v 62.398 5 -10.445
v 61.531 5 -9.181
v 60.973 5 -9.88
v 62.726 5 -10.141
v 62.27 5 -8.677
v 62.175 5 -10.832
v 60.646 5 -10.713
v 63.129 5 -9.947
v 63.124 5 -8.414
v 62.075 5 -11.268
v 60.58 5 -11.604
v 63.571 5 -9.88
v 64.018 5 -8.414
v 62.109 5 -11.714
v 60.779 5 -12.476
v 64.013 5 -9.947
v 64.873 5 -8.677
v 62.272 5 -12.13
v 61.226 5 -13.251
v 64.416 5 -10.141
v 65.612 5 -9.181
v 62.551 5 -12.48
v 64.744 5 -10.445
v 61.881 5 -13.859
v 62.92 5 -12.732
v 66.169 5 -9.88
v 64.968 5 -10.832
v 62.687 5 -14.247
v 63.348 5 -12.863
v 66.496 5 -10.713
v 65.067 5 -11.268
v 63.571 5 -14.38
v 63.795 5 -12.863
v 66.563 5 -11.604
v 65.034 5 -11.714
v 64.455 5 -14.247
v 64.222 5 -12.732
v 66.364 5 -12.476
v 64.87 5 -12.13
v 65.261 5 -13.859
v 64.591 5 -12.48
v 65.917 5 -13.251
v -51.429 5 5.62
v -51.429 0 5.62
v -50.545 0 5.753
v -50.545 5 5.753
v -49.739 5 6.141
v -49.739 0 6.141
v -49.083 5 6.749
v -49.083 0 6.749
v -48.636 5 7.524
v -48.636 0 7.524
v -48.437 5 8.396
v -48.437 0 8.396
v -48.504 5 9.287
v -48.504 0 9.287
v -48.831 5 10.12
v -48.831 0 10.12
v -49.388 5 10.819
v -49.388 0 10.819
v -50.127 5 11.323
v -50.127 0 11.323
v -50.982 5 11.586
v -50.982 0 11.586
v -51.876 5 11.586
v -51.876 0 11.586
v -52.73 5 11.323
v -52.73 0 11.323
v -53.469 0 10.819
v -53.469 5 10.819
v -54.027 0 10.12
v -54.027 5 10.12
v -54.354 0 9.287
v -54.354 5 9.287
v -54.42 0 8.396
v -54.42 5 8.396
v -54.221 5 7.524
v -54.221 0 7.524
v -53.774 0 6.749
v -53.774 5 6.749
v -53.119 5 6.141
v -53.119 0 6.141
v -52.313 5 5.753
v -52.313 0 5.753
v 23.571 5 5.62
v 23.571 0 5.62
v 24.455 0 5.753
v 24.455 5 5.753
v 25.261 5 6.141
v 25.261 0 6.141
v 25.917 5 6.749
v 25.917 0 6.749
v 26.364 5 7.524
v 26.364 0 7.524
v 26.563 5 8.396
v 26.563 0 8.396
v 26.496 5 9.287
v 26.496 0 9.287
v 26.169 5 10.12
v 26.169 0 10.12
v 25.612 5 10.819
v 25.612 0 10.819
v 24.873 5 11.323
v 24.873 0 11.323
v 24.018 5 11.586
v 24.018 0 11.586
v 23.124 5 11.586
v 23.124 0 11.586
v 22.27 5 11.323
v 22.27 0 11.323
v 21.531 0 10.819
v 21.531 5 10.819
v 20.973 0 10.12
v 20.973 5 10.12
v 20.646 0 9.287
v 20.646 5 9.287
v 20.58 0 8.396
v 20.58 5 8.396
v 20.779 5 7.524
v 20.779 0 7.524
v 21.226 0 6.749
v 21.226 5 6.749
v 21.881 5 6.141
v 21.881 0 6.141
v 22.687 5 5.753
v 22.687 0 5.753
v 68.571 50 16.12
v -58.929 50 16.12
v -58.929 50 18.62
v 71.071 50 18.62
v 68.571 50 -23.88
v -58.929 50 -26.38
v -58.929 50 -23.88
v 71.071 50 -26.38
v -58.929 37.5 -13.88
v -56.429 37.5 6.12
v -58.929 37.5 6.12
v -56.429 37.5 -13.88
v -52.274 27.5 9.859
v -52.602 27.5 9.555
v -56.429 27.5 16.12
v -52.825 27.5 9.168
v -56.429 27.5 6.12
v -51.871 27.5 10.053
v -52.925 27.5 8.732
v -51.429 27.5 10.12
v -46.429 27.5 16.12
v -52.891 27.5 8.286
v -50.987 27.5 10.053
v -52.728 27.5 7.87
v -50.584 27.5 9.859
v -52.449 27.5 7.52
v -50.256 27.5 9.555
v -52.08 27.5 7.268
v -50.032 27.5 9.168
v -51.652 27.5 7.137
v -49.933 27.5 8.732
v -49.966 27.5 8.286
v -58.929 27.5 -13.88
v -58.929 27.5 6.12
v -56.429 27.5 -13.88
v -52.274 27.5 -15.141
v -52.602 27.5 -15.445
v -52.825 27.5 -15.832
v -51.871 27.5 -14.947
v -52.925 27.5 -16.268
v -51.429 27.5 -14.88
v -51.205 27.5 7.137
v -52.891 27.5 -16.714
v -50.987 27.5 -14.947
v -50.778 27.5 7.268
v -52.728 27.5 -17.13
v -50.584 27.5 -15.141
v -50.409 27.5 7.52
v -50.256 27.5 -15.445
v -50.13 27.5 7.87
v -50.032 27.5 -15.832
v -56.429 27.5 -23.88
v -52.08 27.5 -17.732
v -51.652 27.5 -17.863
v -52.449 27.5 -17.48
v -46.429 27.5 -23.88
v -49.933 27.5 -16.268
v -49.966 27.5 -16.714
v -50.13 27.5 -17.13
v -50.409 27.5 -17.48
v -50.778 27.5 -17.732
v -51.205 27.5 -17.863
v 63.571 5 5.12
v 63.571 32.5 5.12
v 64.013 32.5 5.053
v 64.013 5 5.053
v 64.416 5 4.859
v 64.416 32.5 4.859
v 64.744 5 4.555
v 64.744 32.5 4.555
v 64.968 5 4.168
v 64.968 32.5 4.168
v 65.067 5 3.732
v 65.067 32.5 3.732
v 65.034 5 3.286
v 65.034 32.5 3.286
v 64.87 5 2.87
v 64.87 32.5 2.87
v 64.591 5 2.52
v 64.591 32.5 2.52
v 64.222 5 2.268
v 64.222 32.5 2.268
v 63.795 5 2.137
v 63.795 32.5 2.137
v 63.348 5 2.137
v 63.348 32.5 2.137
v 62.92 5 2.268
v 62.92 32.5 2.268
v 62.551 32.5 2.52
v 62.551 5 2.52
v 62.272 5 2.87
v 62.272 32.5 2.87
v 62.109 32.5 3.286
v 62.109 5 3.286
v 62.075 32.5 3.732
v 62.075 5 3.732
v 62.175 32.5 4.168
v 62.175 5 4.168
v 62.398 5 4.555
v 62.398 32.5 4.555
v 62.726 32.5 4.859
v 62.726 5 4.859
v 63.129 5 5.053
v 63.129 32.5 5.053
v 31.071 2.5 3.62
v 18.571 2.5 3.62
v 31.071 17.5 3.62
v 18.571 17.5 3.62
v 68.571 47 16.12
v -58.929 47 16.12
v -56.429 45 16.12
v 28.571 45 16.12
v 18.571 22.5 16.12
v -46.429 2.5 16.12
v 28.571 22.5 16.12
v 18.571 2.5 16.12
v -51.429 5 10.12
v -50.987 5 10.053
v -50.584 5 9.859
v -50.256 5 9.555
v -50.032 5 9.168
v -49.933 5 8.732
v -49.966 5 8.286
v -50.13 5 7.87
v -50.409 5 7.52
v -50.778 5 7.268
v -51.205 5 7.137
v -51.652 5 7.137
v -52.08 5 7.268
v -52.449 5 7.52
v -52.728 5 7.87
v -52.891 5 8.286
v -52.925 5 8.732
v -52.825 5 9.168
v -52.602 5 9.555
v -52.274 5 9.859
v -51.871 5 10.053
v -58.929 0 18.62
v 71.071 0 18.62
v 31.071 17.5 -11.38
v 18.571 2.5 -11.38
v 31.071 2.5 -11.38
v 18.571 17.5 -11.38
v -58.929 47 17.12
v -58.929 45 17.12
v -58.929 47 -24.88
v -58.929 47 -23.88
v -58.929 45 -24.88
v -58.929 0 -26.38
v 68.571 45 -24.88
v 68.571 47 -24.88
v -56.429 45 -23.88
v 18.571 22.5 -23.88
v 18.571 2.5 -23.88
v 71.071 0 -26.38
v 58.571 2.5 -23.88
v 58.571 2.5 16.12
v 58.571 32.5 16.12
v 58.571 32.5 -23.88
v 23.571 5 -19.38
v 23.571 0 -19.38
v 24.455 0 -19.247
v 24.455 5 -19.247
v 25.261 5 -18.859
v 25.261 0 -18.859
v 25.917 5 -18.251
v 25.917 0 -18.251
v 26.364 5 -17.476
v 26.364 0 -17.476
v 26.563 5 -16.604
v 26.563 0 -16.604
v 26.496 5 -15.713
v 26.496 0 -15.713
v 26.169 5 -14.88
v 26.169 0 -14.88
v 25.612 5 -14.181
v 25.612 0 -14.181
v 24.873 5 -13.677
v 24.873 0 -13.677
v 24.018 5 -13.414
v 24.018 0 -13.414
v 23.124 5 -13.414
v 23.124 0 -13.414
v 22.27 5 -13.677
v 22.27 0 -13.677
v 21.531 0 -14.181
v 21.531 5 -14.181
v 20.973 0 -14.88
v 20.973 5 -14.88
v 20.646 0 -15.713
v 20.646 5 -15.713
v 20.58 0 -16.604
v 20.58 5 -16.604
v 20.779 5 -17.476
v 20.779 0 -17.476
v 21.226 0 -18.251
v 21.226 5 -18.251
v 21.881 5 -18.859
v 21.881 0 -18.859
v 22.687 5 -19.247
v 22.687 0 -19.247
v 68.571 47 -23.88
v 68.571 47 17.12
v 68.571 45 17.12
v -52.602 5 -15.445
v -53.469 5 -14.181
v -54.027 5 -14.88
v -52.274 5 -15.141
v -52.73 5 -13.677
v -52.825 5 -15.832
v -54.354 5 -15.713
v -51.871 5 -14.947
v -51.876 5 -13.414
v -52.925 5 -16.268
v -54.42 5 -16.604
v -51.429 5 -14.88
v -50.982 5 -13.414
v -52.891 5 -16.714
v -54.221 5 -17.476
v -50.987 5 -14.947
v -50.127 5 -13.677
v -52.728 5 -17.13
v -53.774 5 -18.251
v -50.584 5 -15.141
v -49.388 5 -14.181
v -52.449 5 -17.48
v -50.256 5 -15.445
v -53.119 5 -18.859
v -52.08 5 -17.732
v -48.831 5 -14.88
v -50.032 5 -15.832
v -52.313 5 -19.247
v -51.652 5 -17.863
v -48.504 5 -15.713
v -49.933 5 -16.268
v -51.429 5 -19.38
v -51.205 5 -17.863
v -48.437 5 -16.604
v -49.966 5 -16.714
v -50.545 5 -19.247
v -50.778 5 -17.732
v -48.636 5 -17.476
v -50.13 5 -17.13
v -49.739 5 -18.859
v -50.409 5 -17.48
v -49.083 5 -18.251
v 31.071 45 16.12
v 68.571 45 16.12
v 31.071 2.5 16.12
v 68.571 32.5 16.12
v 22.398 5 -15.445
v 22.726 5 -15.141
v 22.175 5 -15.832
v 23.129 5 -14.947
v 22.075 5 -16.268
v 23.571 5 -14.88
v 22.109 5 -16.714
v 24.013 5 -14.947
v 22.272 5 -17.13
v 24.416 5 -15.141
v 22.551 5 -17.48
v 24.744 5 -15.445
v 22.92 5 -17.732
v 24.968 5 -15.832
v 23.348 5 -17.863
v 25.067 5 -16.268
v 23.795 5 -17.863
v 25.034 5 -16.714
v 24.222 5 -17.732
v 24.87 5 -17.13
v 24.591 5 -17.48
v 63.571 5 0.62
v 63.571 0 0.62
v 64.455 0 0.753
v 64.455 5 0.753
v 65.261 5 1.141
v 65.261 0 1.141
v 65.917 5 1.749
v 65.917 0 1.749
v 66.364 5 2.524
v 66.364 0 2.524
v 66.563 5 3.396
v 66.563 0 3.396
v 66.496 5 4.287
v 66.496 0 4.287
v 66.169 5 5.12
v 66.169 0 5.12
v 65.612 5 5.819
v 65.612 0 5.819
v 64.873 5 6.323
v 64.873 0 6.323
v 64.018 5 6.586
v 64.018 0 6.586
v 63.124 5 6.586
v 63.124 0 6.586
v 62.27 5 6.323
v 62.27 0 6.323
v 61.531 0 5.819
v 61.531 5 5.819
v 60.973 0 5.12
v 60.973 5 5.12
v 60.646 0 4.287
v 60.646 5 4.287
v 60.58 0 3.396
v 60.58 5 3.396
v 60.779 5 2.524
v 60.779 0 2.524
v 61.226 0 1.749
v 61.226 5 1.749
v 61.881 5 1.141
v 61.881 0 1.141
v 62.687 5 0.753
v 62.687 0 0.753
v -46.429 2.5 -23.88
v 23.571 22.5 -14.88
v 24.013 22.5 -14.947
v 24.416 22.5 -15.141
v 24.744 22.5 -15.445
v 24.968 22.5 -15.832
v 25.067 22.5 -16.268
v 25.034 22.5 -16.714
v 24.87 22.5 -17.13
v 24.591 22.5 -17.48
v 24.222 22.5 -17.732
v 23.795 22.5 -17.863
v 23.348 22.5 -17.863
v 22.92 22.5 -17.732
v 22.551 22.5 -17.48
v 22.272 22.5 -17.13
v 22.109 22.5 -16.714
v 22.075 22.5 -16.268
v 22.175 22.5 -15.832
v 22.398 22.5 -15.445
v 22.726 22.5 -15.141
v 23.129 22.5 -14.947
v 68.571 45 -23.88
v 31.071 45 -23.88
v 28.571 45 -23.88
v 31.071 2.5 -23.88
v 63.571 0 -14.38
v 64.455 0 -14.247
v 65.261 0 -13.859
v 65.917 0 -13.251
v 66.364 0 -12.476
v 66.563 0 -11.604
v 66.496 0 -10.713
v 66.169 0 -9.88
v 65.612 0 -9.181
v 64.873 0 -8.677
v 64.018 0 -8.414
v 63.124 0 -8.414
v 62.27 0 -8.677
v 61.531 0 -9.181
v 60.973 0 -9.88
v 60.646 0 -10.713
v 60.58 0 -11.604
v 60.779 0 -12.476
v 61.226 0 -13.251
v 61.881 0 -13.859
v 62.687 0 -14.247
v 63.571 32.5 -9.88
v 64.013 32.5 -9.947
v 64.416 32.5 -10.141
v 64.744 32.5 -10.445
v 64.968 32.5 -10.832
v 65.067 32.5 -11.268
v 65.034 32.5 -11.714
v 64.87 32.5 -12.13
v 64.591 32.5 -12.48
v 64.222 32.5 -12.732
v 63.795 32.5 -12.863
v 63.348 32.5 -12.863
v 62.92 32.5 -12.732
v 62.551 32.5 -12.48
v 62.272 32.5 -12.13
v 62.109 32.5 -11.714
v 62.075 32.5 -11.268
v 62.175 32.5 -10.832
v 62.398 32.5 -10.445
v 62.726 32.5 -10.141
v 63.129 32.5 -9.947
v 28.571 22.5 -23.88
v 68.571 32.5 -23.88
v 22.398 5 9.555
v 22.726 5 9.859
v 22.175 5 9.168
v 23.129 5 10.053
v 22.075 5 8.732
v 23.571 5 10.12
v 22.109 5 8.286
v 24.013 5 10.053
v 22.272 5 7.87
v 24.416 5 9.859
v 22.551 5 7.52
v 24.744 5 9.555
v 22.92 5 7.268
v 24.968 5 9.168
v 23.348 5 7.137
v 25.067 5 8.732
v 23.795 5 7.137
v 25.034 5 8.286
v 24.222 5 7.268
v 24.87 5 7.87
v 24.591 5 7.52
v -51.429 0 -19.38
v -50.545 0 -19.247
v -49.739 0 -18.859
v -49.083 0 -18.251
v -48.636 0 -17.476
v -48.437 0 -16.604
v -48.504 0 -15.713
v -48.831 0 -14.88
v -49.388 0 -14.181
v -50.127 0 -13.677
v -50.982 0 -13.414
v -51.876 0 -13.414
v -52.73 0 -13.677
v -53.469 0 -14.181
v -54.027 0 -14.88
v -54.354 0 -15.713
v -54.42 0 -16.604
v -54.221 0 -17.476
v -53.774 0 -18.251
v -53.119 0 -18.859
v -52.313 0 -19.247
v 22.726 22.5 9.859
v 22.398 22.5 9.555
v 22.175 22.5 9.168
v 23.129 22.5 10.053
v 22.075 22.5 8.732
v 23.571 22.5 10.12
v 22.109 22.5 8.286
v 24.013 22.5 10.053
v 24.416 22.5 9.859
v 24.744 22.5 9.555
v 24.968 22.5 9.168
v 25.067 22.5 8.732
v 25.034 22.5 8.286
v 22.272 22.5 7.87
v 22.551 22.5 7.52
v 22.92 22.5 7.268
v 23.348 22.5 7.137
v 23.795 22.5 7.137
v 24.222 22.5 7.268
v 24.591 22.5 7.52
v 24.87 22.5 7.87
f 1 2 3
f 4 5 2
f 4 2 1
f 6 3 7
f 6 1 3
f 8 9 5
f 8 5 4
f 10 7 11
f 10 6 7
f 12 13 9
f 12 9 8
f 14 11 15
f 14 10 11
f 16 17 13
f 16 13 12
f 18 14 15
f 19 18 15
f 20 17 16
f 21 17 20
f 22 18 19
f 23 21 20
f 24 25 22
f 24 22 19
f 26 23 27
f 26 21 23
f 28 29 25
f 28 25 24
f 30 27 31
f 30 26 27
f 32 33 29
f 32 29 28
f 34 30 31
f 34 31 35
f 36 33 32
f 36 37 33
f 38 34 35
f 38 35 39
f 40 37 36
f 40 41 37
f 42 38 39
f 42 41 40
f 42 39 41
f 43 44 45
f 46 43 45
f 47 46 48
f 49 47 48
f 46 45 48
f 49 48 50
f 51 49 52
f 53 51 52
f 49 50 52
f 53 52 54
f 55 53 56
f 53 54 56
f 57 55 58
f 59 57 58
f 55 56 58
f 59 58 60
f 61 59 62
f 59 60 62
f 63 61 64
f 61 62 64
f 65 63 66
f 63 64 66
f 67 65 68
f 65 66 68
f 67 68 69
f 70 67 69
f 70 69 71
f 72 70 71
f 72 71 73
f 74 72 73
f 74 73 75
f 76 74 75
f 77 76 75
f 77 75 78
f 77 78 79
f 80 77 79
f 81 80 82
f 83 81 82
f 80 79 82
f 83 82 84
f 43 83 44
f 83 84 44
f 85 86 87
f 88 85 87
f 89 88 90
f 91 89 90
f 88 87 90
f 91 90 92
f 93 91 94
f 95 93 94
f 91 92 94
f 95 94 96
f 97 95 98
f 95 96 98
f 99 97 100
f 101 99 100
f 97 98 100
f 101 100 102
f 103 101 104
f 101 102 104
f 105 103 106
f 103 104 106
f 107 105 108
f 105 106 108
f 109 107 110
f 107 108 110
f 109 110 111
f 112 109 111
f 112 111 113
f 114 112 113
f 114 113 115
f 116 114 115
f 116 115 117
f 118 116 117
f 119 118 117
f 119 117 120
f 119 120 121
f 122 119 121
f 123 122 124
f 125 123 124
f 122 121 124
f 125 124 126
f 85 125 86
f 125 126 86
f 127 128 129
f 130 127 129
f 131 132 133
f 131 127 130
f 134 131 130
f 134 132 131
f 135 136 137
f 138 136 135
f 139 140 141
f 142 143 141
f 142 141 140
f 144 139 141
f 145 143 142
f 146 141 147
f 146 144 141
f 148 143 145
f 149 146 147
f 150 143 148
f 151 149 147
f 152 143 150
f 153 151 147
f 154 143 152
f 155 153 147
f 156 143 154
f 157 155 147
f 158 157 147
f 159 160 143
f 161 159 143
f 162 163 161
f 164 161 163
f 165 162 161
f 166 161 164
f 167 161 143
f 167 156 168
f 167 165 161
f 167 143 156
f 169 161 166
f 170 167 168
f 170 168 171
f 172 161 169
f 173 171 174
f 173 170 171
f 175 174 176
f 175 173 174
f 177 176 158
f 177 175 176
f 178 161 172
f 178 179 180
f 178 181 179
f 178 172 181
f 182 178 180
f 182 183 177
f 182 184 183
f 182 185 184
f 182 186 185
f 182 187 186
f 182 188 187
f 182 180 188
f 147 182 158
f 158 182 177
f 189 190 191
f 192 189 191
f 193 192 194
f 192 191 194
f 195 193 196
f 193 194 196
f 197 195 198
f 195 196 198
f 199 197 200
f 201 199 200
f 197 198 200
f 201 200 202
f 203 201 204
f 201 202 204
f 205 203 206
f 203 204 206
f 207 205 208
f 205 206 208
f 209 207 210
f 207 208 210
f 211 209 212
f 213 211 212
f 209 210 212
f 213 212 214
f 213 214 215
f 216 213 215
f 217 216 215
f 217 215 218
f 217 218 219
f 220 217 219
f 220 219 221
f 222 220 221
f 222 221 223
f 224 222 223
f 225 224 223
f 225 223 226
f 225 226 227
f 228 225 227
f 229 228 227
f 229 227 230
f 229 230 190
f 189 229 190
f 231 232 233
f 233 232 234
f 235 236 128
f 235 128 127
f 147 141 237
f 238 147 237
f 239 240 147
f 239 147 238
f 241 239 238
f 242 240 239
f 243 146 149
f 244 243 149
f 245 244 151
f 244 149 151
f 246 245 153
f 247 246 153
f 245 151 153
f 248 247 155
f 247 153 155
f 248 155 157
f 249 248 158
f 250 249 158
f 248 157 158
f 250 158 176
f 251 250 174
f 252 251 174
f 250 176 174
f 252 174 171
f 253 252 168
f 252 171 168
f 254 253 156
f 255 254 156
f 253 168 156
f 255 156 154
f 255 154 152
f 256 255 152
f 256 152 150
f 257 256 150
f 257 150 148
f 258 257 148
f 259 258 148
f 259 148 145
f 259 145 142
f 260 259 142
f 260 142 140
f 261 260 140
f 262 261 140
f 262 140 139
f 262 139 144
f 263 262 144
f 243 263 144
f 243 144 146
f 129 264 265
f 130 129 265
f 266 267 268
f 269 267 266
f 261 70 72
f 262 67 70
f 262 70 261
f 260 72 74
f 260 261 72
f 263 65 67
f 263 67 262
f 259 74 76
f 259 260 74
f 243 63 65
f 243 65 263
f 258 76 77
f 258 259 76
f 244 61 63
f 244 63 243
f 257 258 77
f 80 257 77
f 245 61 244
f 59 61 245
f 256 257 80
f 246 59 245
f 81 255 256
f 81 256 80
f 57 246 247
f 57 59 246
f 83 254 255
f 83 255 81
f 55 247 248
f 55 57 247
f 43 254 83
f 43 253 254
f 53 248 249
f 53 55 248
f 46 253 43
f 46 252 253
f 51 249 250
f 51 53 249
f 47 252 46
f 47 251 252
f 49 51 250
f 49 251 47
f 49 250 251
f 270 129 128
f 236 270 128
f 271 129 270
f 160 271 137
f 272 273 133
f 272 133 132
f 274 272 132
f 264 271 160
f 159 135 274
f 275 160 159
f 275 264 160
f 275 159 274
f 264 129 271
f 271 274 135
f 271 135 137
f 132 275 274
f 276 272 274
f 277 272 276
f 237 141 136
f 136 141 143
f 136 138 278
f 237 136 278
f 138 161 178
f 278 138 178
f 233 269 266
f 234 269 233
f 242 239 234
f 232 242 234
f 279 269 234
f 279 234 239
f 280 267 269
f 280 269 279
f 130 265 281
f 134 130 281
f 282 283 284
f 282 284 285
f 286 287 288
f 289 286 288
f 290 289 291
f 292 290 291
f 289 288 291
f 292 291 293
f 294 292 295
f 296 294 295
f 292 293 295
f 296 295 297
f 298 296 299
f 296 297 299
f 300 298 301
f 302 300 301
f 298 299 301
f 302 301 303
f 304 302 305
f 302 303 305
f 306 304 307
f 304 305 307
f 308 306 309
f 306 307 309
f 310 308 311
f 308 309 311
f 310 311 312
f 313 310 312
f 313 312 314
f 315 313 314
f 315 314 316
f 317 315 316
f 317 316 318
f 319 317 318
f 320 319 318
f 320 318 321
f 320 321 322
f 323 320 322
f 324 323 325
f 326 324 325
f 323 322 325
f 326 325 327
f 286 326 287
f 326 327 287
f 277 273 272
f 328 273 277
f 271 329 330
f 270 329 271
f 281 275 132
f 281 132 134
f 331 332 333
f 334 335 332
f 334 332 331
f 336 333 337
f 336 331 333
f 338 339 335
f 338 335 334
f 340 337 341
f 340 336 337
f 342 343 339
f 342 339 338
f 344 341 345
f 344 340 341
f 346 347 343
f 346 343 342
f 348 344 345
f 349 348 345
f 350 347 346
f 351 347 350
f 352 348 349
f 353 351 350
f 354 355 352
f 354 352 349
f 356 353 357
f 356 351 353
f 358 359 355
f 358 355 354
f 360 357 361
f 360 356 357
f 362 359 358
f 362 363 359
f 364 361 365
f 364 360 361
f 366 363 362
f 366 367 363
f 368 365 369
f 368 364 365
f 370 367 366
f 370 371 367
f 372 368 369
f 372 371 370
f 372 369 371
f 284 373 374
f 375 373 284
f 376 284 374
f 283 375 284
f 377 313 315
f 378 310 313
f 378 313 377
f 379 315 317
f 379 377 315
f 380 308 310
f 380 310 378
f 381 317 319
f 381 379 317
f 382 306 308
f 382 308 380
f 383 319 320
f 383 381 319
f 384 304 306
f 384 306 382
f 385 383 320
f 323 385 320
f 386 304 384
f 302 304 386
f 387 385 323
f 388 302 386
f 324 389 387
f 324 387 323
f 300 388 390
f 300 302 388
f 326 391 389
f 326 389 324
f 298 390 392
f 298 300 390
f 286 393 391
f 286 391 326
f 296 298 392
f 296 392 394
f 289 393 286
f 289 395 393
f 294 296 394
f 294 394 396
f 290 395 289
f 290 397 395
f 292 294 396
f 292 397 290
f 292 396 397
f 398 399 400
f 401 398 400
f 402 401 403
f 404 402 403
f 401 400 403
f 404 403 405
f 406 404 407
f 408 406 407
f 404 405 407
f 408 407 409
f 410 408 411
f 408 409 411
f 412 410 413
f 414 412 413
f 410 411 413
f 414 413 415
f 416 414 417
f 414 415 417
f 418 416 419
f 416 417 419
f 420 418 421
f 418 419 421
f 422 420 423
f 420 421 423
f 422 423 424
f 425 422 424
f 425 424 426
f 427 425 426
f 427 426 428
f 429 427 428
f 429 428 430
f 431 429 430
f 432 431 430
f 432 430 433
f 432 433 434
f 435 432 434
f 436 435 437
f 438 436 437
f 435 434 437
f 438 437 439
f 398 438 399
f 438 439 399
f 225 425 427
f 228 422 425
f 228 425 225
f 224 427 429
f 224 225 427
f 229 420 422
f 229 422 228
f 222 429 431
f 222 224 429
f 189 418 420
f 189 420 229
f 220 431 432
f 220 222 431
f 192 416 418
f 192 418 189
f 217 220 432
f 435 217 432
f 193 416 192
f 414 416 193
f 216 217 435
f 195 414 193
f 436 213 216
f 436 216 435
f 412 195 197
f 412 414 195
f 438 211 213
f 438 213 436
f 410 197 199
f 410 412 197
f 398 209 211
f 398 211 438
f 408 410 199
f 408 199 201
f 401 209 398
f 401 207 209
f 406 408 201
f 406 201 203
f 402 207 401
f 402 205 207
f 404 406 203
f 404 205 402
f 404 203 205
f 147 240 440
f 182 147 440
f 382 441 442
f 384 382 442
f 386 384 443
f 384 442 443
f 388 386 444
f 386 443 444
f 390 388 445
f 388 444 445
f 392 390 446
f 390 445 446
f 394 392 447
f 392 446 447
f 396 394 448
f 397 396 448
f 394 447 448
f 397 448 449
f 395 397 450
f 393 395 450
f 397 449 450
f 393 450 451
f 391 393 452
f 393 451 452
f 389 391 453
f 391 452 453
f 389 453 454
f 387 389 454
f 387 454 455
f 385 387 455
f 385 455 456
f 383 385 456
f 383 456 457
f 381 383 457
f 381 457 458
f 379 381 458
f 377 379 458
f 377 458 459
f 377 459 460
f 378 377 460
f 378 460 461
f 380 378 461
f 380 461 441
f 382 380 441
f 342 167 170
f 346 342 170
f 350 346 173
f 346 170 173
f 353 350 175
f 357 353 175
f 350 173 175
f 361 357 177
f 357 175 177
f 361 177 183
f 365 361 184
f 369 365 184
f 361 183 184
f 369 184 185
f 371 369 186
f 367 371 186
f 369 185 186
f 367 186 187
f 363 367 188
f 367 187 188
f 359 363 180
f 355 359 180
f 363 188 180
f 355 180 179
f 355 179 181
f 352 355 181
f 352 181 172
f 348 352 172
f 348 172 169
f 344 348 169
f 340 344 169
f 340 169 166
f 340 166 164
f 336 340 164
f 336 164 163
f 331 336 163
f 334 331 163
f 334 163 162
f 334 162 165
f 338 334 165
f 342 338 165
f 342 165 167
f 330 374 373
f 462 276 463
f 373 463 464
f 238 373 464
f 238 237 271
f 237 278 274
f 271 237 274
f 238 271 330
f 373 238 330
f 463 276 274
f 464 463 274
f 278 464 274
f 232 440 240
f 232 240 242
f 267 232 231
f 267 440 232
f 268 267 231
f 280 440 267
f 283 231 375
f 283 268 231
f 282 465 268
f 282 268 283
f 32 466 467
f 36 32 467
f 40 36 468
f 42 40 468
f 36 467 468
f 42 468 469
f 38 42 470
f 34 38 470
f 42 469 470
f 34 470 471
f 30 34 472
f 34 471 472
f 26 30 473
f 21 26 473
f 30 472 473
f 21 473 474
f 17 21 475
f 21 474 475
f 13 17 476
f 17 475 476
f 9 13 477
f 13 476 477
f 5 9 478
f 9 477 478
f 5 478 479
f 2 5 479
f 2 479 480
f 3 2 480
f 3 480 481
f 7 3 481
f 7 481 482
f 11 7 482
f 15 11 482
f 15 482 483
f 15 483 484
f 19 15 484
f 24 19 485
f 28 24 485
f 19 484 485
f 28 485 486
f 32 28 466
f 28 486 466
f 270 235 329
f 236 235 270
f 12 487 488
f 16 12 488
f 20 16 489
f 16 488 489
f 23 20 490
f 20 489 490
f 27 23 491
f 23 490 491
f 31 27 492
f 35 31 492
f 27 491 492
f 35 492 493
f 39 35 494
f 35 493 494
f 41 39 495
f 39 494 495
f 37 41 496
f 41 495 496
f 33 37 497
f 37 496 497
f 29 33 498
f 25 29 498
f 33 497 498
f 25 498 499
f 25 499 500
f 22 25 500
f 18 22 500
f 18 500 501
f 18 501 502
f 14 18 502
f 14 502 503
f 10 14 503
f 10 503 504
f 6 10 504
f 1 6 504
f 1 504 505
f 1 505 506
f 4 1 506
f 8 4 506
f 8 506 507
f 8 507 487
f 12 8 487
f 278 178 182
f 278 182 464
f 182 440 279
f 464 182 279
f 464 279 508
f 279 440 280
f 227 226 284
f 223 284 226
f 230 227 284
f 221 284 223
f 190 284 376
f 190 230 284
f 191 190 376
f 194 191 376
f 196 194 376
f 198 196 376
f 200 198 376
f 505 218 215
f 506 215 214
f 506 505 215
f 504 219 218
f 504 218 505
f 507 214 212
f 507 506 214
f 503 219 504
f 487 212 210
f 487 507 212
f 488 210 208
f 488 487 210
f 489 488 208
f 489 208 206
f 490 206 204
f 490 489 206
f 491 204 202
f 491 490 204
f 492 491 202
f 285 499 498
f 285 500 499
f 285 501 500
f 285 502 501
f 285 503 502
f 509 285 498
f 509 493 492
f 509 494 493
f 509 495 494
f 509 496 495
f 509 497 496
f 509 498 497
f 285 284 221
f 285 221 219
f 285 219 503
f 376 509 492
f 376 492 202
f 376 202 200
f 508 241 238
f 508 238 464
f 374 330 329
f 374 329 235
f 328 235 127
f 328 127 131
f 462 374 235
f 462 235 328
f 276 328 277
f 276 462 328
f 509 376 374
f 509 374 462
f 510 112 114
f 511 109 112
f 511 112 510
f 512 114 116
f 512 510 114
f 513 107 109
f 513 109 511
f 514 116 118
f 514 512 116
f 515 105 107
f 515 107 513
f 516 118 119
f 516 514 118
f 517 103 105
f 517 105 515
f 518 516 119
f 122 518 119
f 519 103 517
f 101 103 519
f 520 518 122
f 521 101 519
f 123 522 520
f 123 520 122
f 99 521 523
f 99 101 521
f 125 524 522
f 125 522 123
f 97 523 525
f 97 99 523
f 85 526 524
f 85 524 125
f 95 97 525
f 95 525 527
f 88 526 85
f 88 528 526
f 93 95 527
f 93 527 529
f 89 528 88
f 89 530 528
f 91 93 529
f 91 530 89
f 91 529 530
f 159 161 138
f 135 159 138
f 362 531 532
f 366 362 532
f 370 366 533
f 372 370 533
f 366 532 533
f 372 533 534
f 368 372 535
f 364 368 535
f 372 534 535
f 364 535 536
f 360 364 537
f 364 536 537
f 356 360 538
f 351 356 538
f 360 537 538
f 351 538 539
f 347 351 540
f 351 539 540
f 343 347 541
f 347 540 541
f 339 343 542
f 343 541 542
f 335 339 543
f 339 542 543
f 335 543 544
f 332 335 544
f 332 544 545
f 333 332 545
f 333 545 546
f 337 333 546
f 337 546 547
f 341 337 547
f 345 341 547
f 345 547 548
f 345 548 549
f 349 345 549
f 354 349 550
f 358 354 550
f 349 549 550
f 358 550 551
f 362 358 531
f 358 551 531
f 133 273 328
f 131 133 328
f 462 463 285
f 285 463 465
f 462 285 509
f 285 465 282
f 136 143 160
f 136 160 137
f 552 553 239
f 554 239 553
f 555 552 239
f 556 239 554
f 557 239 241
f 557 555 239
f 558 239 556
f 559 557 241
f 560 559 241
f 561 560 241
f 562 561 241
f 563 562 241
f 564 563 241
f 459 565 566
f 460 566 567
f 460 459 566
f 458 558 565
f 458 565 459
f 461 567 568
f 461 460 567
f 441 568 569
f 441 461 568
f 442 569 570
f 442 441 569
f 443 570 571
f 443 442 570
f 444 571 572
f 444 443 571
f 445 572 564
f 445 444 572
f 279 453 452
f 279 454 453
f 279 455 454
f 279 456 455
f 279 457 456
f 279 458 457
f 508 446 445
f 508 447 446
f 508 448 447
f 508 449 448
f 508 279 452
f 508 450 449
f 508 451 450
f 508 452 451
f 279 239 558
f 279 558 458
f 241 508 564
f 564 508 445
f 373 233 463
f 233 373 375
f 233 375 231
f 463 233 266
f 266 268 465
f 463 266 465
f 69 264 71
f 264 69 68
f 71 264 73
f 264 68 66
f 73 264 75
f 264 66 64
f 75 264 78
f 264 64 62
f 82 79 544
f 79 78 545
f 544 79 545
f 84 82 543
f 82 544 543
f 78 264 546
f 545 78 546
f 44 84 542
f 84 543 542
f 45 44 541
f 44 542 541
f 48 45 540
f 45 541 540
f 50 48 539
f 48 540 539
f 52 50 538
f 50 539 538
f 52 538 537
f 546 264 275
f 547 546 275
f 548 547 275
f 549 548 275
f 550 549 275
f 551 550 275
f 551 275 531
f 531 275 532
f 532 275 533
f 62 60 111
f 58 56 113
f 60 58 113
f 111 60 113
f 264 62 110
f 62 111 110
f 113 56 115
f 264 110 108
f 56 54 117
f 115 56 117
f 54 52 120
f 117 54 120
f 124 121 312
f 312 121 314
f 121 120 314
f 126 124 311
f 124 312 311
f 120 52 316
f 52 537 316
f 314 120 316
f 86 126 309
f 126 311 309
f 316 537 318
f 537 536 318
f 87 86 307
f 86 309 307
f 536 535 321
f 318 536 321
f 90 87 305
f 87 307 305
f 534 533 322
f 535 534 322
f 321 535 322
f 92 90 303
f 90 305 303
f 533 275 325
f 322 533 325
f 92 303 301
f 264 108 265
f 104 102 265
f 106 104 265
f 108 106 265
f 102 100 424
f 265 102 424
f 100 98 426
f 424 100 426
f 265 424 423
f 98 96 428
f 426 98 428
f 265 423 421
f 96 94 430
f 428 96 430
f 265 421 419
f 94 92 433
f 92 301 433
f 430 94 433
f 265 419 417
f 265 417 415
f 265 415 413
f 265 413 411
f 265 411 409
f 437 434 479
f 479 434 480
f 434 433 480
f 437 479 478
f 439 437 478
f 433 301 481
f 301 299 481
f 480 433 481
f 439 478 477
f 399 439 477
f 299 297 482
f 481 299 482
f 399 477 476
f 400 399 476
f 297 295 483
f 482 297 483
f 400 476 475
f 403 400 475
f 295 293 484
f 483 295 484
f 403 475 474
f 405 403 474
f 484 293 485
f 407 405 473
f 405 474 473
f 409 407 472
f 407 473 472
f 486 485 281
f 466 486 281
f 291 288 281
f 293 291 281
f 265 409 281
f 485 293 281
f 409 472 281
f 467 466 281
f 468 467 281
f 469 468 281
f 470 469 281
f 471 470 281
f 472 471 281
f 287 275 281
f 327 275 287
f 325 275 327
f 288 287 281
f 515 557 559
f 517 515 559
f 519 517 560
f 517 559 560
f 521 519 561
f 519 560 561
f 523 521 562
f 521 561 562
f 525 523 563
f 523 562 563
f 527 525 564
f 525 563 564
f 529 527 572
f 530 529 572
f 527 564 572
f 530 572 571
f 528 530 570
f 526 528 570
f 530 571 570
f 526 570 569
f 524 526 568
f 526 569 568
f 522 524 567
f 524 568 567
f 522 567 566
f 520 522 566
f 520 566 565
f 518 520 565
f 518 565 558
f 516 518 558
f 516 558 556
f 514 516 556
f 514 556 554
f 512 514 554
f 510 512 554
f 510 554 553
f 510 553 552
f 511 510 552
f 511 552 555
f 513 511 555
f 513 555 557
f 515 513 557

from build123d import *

# Parameters (mm, degrees)
SKETCH1_W           = 130
SKETCH1_H           = 45
BOSS_EXTRUDE1_DEPTH = 50
SHELL1_T            = -2.5
SKETCH2_W           = 10
SKETCH2_H           = 40
BOSS_EXTRUDE2_DEPTH = 30
SKETCH5_W           = 2.5
SKETCH5_H           = 40
BOSS_EXTRUDE3_DEPTH = 47.5
SKETCH6_W           = 10
SKETCH6_H           = 40
BOSS_EXTRUDE4_DEPTH = 20
SKETCH7_W           = 10
SKETCH7_H           = 40
BOSS_EXTRUDE5_DEPTH = 25
SKETCH9_W           = 20
SKETCH9_H           = 10
CUT_EXTRUDE1_DEPTH  = 2.5
SKETCH11_W          = 15
SKETCH11_H          = 15
CUT_EXTRUDE2_DEPTH  = 12.5
SKETCH12_W          = 40
SKETCH12_H          = 5
CUT_EXTRUDE3_DEPTH  = 2.5
SKETCH20_R          = 1.5
CUT_EXTRUDE5_DEPTH  = 32.5
SKETCH21_R          = 1.5
CUT_EXTRUDE6_DEPTH  = 22.5
SKETCH22_R          = 1.5
CUT_EXTRUDE7_DEPTH  = 27.5
SKETCH24_R          = 3
CUT_EXTRUDE8_DEPTH  = 5
SKETCH25_W          = 40
SKETCH25_H          = 5
CUT_EXTRUDE9_DEPTH  = 2.5
SKETCH26_W          = 127.5
SKETCH26_H          = 2
CUT_EXTRUDE10_DEPTH = 1
SKETCH27_W          = 127.5
SKETCH27_H          = 2
CUT_EXTRUDE11_DEPTH = 1


with BuildPart() as part:
    # Sketch1 → Boss-Extrude1 (new body)
    with BuildSketch(Plane(origin=(0, 0, 0), x_dir=(1, 0, 0), z_dir=(0, 1, 0))):
        with Locations((6.071202057, 3.880136761)):
            Rectangle(SKETCH1_W, SKETCH1_H)
    extrude(amount=BOSS_EXTRUDE1_DEPTH)

    # Shell1
    shell1_openings = [part.faces().sort_by_distance(p)[0] for p in [
        (6.071202057, 50, -3.880136761),
    ]]
    offset(amount=SHELL1_T, openings=shell1_openings, kind=Kind.INTERSECTION)

    # Sketch2 → Boss-Extrude2 (add)
    with BuildSketch(Plane(origin=(0, 2.5, 0), x_dir=(1, 0, 0), z_dir=(0, 1, 0))):
        with Locations((63.571202057, 3.880136761)):
            Rectangle(SKETCH2_W, SKETCH2_H)
    extrude(amount=BOSS_EXTRUDE2_DEPTH)

    # Sketch5 → Boss-Extrude3 (add)
    with BuildSketch(Plane(origin=(0, 2.5, 0), x_dir=(1, 0, 0), z_dir=(0, 1, 0))):
        with Locations((29.821202057, 3.880136761)):
            Rectangle(SKETCH5_W, SKETCH5_H)
    extrude(amount=BOSS_EXTRUDE3_DEPTH)

    # Sketch6 → Boss-Extrude4 (add)
    with BuildSketch(Plane(origin=(0, 2.5, 0), x_dir=(1, 0, 0), z_dir=(0, 1, 0))):
        with Locations((23.571202057, 3.880136761)):
            Rectangle(SKETCH6_W, SKETCH6_H)
    extrude(amount=BOSS_EXTRUDE4_DEPTH)

    # Sketch7 → Boss-Extrude5 (add)
    with BuildSketch(Plane(origin=(0, 2.5, 0), x_dir=(1, 0, 0), z_dir=(0, 1, 0))):
        with Locations((-51.428797943, 3.880136761)):
            Rectangle(SKETCH7_W, SKETCH7_H)
    extrude(amount=BOSS_EXTRUDE5_DEPTH)

    # Sketch9 → Cut-Extrude1 (cut)
    with BuildSketch(Plane(origin=(-56.428797943, 0, 0), x_dir=(0, 0, -1), z_dir=(1, 0, 0))):
        with Locations((3.880136761, 32.5)):
            Rectangle(SKETCH9_W, SKETCH9_H)
    extrude(amount=-CUT_EXTRUDE1_DEPTH, mode=Mode.SUBTRACT)

    # Sketch11 → Cut-Extrude2 (cut)
    with BuildSketch(Plane.ZY.offset(-18.571202057)):
        with Locations((-3.880136761, 10)):
            Rectangle(SKETCH11_W, SKETCH11_H)
    extrude(amount=-CUT_EXTRUDE2_DEPTH, mode=Mode.SUBTRACT)

    # Sketch12 → Cut-Extrude3 (cut)
    with BuildSketch(Plane(origin=(-56.428797943, 0, 0), x_dir=(0, 0, -1), z_dir=(1, 0, 0))):
        with Locations((3.880136761, 47.5)):
            Rectangle(SKETCH12_W, SKETCH12_H)
    extrude(amount=-CUT_EXTRUDE3_DEPTH, mode=Mode.SUBTRACT)

    # Sketch20 → Cut-Extrude5 (cut)
    with BuildSketch(Plane(origin=(0, 32.5, 0), x_dir=(1, 0, 0), z_dir=(0, 1, 0))):
        with Locations(Location((63.571202057, -3.619863239, 0), (0, 0, 270))):
            Circle(SKETCH20_R)
        with Locations(Location((63.571202057, 11.380136761, 0), (0, 0, 270))):
            Circle(SKETCH20_R)
    extrude(amount=-CUT_EXTRUDE5_DEPTH, mode=Mode.SUBTRACT)

    # Sketch21 → Cut-Extrude6 (cut)
    with BuildSketch(Plane(origin=(0, 22.5, 0), x_dir=(1, 0, 0), z_dir=(0, 1, 0))):
        with Locations(Location((23.571202057, -8.619863239, 0), (0, 0, 270))):
            Circle(SKETCH21_R)
        with Locations(Location((23.571202057, 16.380136761, 0), (0, 0, 270))):
            Circle(SKETCH21_R)
    extrude(amount=-CUT_EXTRUDE6_DEPTH, mode=Mode.SUBTRACT)

    # Sketch22 → Cut-Extrude7 (cut)
    with BuildSketch(Plane(origin=(0, 27.5, 0), x_dir=(1, 0, 0), z_dir=(0, 1, 0))):
        with Locations(Location((-51.428797943, -8.619863239, 0), (0, 0, 270))):
            Circle(SKETCH22_R)
        with Locations(Location((-51.428797943, 16.380136761, 0), (0, 0, 270))):
            Circle(SKETCH22_R)
    extrude(amount=-CUT_EXTRUDE7_DEPTH, mode=Mode.SUBTRACT)

    # Sketch24 → Cut-Extrude8 (cut)
    with BuildSketch(Plane.XZ):
        with Locations(Location((-51.428797943, 8.619863239, 0), (0, 0, 270))):
            Circle(SKETCH24_R)
        with Locations(Location((-51.428797943, -16.380136761, 0), (0, 0, 270))):
            Circle(SKETCH24_R)
        with Locations(Location((23.571202057, 8.619863239, 0), (0, 0, 270))):
            Circle(SKETCH24_R)
        with Locations(Location((23.571202057, -16.380136761, 0), (0, 0, 270))):
            Circle(SKETCH24_R)
        with Locations(Location((63.571202057, 3.619863239, 0), (0, 0, 270))):
            Circle(SKETCH24_R)
        with Locations(Location((63.571202057, -11.380136761, 0), (0, 0, 270))):
            Circle(SKETCH24_R)
    extrude(amount=-CUT_EXTRUDE8_DEPTH, mode=Mode.SUBTRACT)

    # Sketch25 → Cut-Extrude9 (cut)
    with BuildSketch(Plane.ZY.offset(-28.571202057)):
        with Locations((-3.880136761, 47.5)):
            Rectangle(SKETCH25_W, SKETCH25_H)
    extrude(amount=-CUT_EXTRUDE9_DEPTH, mode=Mode.SUBTRACT)

    # Sketch26 → Cut-Extrude10 (cut)
    with BuildSketch(Plane(origin=(0, 0, 16.119863239), x_dir=(-1, 0, 0), z_dir=(0, 0, -1))):
        with Locations((-4.821202057, 46)):
            Rectangle(SKETCH26_W, SKETCH26_H)
    extrude(amount=-CUT_EXTRUDE10_DEPTH, mode=Mode.SUBTRACT)

    # Sketch27 → Cut-Extrude11 (cut)
    with BuildSketch(Plane.XY.offset(-23.880136761)):
        with Locations((4.821202057, 46)):
            Rectangle(SKETCH27_W, SKETCH27_H)
    extrude(amount=-CUT_EXTRUDE11_DEPTH, mode=Mode.SUBTRACT)


solid = part.part
